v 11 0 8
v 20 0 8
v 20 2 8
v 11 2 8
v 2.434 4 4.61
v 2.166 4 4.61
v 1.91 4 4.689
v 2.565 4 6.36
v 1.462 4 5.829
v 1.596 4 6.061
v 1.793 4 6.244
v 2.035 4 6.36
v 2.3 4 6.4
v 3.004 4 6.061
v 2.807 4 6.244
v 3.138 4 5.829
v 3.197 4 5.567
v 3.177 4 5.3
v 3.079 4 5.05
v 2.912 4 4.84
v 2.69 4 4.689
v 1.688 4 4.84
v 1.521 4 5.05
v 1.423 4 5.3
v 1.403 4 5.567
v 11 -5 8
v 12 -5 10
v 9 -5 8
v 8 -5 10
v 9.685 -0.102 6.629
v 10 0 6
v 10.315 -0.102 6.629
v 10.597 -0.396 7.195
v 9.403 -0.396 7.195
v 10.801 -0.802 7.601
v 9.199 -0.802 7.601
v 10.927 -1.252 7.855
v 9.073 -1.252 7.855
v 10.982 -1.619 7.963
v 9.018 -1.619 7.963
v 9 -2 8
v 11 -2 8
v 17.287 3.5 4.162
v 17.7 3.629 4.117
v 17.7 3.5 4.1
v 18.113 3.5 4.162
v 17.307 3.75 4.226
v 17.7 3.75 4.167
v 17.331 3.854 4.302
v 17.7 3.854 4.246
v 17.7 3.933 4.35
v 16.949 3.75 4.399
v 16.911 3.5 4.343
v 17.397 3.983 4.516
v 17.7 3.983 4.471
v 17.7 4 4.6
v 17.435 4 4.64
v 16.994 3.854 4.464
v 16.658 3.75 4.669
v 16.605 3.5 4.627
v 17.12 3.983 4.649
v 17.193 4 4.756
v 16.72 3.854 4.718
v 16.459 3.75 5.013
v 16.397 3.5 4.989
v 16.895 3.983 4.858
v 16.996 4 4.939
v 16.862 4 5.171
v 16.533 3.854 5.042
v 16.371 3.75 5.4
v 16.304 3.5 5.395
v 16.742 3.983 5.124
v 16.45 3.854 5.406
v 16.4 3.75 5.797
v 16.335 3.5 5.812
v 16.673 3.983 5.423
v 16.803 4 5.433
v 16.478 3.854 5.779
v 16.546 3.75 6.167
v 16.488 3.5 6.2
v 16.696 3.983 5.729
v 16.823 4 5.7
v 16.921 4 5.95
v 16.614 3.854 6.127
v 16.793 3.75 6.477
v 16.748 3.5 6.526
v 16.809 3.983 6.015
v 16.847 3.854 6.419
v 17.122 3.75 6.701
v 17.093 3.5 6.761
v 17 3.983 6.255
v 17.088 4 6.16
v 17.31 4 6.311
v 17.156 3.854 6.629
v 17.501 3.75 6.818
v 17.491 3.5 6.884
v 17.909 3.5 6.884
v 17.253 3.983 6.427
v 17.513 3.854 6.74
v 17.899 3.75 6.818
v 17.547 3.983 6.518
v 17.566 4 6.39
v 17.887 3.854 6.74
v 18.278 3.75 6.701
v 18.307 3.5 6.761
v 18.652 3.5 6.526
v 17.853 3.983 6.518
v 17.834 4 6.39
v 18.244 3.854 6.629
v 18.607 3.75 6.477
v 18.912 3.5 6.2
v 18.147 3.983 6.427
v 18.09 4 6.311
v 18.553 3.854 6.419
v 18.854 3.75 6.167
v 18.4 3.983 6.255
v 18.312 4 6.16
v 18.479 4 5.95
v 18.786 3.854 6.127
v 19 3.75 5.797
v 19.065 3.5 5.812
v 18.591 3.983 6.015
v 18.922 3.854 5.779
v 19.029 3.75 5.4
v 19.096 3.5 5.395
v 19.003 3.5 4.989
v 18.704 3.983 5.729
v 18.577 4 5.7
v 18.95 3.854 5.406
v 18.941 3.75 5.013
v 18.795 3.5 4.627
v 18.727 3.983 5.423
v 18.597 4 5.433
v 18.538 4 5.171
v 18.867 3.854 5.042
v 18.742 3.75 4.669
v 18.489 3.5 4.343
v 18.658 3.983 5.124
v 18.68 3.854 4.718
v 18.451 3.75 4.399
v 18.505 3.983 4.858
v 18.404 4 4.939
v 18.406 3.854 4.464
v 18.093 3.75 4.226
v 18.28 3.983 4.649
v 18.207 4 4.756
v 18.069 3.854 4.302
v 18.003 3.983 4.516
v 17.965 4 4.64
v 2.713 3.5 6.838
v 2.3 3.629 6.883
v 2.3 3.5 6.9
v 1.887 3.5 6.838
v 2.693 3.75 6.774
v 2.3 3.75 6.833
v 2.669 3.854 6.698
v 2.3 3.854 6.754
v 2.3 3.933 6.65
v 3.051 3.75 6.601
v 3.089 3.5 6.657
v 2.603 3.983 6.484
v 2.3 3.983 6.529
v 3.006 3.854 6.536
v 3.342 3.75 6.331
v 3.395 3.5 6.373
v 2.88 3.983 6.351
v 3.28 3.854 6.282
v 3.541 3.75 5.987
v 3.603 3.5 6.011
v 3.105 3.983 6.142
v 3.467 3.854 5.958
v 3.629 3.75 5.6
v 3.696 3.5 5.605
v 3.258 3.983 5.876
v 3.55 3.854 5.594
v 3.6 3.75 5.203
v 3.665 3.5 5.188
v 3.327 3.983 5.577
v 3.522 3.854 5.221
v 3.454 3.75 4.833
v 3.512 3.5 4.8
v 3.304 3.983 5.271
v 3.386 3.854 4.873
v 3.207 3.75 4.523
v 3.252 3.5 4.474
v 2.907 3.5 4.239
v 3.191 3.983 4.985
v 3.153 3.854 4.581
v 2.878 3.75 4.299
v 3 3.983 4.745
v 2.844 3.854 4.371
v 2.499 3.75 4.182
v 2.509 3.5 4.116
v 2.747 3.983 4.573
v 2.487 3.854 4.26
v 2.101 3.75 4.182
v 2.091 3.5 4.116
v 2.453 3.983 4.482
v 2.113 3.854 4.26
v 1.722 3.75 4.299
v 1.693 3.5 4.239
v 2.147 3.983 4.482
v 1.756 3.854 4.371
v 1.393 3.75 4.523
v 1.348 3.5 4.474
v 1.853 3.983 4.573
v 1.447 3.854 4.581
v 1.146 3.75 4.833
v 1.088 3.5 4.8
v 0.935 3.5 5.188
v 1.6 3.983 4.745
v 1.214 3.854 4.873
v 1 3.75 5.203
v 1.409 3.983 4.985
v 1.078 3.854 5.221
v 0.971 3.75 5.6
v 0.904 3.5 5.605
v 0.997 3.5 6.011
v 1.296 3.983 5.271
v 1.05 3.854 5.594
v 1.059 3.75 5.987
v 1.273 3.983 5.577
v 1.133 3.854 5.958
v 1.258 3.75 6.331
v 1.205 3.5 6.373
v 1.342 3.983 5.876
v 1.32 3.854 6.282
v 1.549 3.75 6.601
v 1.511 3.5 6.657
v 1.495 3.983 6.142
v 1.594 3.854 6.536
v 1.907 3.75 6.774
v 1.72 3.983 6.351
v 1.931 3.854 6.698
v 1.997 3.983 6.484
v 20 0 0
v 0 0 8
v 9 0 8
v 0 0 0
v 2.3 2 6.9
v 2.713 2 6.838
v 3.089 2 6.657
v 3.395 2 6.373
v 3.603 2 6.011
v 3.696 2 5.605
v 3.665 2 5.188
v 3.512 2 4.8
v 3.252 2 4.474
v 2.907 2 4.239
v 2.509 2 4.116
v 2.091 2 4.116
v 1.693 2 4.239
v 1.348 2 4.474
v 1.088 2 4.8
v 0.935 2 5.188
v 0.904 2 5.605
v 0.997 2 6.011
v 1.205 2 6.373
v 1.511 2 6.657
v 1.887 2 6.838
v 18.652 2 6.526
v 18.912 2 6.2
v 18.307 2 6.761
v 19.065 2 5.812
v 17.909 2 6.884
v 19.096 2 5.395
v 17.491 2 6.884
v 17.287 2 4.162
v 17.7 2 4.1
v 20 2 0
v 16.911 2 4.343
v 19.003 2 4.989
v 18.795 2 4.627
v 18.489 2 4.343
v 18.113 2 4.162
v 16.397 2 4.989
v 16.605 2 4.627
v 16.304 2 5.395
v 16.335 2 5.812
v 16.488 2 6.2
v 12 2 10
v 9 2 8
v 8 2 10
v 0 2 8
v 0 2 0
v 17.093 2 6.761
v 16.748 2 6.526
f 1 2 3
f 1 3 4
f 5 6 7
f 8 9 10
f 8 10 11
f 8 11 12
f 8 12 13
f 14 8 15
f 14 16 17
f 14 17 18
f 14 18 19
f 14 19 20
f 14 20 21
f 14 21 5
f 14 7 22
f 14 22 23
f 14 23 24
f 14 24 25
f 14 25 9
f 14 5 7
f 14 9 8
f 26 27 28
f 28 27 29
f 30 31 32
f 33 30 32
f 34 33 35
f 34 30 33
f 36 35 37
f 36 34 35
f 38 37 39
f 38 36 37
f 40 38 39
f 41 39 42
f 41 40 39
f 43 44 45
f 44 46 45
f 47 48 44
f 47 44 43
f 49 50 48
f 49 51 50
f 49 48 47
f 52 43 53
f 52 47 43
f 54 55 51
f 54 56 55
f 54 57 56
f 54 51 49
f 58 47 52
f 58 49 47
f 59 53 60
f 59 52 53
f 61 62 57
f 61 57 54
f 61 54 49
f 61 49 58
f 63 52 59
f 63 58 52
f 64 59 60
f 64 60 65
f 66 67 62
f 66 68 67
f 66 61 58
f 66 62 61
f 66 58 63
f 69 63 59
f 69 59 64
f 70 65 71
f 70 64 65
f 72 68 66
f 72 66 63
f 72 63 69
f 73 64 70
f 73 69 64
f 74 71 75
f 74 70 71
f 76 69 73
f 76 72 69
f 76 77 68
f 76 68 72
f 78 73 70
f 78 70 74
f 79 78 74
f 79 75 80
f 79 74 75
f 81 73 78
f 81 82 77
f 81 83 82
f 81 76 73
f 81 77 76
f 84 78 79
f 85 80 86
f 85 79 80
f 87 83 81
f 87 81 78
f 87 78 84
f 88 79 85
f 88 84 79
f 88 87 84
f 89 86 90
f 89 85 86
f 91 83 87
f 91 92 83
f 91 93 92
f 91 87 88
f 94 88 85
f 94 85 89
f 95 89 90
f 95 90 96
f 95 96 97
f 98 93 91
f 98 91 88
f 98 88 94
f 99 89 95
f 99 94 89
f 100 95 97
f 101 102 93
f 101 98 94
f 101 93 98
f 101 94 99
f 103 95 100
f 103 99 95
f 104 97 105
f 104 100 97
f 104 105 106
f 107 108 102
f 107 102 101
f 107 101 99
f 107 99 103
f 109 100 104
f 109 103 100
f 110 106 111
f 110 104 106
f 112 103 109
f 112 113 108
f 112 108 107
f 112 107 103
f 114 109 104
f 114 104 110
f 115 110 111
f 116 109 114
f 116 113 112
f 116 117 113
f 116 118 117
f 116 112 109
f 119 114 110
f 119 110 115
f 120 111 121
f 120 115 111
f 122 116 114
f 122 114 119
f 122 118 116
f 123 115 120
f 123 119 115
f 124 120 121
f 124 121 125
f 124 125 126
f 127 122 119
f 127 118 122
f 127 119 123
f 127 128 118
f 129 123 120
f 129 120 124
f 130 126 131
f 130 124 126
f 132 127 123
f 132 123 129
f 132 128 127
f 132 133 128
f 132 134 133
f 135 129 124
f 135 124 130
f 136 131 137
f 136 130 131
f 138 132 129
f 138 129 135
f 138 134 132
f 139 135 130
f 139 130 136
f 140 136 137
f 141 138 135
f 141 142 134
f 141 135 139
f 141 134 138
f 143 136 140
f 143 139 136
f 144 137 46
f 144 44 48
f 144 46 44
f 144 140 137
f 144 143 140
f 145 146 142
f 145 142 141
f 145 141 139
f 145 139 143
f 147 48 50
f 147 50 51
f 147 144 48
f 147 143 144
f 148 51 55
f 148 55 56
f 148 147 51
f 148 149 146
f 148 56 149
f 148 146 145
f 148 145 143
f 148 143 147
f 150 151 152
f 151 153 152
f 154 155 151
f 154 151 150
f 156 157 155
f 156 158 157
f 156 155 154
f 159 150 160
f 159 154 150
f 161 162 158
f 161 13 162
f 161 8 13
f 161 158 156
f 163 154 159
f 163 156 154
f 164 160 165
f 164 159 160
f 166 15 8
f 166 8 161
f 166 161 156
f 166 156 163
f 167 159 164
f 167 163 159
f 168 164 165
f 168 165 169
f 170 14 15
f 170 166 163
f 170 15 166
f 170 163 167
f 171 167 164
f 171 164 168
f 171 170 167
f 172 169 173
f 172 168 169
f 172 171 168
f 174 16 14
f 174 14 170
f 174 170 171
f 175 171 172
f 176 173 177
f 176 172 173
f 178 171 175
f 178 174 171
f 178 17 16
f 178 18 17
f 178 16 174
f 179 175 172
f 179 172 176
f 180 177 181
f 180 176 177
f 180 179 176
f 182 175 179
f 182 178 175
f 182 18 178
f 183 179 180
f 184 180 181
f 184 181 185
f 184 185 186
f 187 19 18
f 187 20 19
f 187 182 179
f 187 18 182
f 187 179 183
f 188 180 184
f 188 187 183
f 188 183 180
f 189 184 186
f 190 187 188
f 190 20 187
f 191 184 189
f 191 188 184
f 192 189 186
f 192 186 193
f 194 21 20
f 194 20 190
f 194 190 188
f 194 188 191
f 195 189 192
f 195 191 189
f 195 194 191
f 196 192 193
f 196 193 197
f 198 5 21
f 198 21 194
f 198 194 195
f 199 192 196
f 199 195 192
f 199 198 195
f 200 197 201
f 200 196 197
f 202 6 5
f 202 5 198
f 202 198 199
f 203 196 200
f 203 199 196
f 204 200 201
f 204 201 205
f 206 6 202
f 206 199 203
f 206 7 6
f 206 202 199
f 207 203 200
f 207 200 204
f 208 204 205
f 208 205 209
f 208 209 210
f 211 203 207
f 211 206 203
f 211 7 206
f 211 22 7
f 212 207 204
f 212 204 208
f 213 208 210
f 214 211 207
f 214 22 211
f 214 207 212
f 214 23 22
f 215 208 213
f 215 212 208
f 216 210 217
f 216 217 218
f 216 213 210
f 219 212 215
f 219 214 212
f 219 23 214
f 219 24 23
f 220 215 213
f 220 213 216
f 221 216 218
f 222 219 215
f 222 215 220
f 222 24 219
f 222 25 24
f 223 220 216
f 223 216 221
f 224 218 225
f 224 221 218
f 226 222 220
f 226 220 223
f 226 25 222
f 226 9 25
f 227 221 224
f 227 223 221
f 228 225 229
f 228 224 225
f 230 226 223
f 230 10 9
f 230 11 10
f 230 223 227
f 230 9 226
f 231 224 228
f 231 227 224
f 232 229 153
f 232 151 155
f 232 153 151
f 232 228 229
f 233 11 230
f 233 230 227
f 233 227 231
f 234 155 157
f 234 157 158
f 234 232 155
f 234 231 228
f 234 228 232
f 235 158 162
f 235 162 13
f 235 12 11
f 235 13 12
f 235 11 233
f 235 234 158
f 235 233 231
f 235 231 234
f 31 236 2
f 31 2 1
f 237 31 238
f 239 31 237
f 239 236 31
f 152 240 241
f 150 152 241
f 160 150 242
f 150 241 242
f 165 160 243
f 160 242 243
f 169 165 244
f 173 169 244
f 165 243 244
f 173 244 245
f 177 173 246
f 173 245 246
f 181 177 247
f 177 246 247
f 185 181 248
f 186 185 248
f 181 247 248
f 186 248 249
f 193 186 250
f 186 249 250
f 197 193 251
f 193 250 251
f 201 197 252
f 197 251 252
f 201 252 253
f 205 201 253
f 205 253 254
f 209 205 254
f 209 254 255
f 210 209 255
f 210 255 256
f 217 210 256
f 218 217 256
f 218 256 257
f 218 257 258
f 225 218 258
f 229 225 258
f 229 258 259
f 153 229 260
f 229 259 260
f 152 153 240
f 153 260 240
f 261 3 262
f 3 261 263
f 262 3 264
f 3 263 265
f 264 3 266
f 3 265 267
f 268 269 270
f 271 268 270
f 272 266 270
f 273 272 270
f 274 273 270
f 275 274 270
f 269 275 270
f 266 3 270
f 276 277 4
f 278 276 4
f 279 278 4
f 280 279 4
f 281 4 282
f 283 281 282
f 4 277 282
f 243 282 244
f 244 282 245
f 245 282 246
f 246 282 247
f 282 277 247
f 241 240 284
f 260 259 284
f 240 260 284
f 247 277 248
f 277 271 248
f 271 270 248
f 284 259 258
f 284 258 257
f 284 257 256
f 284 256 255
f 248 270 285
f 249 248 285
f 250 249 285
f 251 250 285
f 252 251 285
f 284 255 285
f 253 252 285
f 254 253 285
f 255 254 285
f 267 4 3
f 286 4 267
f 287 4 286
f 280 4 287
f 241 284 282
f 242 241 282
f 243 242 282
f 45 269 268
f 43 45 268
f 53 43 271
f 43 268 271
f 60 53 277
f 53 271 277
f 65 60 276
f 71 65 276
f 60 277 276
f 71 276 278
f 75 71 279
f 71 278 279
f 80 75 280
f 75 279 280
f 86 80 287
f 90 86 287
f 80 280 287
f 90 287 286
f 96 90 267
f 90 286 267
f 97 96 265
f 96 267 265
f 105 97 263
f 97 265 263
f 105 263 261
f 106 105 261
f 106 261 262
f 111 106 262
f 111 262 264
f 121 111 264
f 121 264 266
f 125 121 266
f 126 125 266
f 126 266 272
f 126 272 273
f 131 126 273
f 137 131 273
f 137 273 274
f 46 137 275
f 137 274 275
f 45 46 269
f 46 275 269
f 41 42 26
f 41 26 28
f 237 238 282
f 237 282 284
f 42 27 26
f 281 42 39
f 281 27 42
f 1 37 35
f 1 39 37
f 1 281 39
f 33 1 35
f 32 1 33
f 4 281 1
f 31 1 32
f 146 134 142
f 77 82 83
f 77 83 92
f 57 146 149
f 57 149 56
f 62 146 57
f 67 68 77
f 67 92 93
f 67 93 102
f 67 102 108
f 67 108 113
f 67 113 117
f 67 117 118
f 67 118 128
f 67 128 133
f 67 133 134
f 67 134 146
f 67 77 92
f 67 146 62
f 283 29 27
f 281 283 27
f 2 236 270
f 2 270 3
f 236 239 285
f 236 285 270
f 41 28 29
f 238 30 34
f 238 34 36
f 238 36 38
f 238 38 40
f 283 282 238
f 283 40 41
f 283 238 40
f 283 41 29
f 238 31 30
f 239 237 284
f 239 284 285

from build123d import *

# Parameters (mm, degrees)
BOSS_EXTRUDE1_DEPTH = 2
SKETCH2_R           = 1.4000000000000001
SKETCH2_R_2         = 1.399999999999999
BOSS_EXTRUDE2_DEPTH = 2
FILLET1_R           = 0.5
BOSS_EXTRUDE3_DEPTH = 5
FILLET2_R           = 2


with BuildPart() as part:
    # Sketch1 → Boss-Extrude1 (new body)
    with BuildSketch(Plane(origin=(0, 0, 0), x_dir=(1, 0, 0), z_dir=(0, 1, 0))):
        Polygon((0, 0), (20, 0), (20, -8), (11.000000000000002, -8), (12, -10), (8.000000000000002, -10), (9.000000000000002, -8), (9.8e-16, -8), align=None)
    extrude(amount=BOSS_EXTRUDE1_DEPTH)

    # Sketch2 → Boss-Extrude2 (add)
    with BuildSketch(Plane(origin=(0, 2, 0), x_dir=(1, 0, 0), z_dir=(0, 1, 0))):
        with Locations(Location((2.3000000000000007, -5.5, 0), (0, 0, 270))):
            Circle(SKETCH2_R)
        with Locations(Location((17.7, -5.499999999999998, 0), (0, 0, 90))):
            Circle(SKETCH2_R_2)
    extrude(amount=BOSS_EXTRUDE2_DEPTH)

    # Fillet1
    fillet1_edges = [part.edges().sort_by_distance(p)[0] for p in [
        (2.3000000000000016, 4, 4.1),
        (17.7, 4, 6.899999999999997),
    ]]
    fillet(fillet1_edges, radius=FILLET1_R)

    # Sketch3 → Boss-Extrude3 (add)
    with BuildSketch(Plane.XZ):
        Polygon((8.000000000000002, 10), (12, 10), (11.000000000000002, 8), (9.000000000000002, 8), align=None)
    extrude(amount=BOSS_EXTRUDE3_DEPTH)

    # Fillet2
    fillet2_edges = [part.edges().sort_by_distance(p)[0] for p in [
        (10.000000000000002, 0, 8),
    ]]
    fillet(fillet2_edges, radius=FILLET2_R)


solid = part.part
